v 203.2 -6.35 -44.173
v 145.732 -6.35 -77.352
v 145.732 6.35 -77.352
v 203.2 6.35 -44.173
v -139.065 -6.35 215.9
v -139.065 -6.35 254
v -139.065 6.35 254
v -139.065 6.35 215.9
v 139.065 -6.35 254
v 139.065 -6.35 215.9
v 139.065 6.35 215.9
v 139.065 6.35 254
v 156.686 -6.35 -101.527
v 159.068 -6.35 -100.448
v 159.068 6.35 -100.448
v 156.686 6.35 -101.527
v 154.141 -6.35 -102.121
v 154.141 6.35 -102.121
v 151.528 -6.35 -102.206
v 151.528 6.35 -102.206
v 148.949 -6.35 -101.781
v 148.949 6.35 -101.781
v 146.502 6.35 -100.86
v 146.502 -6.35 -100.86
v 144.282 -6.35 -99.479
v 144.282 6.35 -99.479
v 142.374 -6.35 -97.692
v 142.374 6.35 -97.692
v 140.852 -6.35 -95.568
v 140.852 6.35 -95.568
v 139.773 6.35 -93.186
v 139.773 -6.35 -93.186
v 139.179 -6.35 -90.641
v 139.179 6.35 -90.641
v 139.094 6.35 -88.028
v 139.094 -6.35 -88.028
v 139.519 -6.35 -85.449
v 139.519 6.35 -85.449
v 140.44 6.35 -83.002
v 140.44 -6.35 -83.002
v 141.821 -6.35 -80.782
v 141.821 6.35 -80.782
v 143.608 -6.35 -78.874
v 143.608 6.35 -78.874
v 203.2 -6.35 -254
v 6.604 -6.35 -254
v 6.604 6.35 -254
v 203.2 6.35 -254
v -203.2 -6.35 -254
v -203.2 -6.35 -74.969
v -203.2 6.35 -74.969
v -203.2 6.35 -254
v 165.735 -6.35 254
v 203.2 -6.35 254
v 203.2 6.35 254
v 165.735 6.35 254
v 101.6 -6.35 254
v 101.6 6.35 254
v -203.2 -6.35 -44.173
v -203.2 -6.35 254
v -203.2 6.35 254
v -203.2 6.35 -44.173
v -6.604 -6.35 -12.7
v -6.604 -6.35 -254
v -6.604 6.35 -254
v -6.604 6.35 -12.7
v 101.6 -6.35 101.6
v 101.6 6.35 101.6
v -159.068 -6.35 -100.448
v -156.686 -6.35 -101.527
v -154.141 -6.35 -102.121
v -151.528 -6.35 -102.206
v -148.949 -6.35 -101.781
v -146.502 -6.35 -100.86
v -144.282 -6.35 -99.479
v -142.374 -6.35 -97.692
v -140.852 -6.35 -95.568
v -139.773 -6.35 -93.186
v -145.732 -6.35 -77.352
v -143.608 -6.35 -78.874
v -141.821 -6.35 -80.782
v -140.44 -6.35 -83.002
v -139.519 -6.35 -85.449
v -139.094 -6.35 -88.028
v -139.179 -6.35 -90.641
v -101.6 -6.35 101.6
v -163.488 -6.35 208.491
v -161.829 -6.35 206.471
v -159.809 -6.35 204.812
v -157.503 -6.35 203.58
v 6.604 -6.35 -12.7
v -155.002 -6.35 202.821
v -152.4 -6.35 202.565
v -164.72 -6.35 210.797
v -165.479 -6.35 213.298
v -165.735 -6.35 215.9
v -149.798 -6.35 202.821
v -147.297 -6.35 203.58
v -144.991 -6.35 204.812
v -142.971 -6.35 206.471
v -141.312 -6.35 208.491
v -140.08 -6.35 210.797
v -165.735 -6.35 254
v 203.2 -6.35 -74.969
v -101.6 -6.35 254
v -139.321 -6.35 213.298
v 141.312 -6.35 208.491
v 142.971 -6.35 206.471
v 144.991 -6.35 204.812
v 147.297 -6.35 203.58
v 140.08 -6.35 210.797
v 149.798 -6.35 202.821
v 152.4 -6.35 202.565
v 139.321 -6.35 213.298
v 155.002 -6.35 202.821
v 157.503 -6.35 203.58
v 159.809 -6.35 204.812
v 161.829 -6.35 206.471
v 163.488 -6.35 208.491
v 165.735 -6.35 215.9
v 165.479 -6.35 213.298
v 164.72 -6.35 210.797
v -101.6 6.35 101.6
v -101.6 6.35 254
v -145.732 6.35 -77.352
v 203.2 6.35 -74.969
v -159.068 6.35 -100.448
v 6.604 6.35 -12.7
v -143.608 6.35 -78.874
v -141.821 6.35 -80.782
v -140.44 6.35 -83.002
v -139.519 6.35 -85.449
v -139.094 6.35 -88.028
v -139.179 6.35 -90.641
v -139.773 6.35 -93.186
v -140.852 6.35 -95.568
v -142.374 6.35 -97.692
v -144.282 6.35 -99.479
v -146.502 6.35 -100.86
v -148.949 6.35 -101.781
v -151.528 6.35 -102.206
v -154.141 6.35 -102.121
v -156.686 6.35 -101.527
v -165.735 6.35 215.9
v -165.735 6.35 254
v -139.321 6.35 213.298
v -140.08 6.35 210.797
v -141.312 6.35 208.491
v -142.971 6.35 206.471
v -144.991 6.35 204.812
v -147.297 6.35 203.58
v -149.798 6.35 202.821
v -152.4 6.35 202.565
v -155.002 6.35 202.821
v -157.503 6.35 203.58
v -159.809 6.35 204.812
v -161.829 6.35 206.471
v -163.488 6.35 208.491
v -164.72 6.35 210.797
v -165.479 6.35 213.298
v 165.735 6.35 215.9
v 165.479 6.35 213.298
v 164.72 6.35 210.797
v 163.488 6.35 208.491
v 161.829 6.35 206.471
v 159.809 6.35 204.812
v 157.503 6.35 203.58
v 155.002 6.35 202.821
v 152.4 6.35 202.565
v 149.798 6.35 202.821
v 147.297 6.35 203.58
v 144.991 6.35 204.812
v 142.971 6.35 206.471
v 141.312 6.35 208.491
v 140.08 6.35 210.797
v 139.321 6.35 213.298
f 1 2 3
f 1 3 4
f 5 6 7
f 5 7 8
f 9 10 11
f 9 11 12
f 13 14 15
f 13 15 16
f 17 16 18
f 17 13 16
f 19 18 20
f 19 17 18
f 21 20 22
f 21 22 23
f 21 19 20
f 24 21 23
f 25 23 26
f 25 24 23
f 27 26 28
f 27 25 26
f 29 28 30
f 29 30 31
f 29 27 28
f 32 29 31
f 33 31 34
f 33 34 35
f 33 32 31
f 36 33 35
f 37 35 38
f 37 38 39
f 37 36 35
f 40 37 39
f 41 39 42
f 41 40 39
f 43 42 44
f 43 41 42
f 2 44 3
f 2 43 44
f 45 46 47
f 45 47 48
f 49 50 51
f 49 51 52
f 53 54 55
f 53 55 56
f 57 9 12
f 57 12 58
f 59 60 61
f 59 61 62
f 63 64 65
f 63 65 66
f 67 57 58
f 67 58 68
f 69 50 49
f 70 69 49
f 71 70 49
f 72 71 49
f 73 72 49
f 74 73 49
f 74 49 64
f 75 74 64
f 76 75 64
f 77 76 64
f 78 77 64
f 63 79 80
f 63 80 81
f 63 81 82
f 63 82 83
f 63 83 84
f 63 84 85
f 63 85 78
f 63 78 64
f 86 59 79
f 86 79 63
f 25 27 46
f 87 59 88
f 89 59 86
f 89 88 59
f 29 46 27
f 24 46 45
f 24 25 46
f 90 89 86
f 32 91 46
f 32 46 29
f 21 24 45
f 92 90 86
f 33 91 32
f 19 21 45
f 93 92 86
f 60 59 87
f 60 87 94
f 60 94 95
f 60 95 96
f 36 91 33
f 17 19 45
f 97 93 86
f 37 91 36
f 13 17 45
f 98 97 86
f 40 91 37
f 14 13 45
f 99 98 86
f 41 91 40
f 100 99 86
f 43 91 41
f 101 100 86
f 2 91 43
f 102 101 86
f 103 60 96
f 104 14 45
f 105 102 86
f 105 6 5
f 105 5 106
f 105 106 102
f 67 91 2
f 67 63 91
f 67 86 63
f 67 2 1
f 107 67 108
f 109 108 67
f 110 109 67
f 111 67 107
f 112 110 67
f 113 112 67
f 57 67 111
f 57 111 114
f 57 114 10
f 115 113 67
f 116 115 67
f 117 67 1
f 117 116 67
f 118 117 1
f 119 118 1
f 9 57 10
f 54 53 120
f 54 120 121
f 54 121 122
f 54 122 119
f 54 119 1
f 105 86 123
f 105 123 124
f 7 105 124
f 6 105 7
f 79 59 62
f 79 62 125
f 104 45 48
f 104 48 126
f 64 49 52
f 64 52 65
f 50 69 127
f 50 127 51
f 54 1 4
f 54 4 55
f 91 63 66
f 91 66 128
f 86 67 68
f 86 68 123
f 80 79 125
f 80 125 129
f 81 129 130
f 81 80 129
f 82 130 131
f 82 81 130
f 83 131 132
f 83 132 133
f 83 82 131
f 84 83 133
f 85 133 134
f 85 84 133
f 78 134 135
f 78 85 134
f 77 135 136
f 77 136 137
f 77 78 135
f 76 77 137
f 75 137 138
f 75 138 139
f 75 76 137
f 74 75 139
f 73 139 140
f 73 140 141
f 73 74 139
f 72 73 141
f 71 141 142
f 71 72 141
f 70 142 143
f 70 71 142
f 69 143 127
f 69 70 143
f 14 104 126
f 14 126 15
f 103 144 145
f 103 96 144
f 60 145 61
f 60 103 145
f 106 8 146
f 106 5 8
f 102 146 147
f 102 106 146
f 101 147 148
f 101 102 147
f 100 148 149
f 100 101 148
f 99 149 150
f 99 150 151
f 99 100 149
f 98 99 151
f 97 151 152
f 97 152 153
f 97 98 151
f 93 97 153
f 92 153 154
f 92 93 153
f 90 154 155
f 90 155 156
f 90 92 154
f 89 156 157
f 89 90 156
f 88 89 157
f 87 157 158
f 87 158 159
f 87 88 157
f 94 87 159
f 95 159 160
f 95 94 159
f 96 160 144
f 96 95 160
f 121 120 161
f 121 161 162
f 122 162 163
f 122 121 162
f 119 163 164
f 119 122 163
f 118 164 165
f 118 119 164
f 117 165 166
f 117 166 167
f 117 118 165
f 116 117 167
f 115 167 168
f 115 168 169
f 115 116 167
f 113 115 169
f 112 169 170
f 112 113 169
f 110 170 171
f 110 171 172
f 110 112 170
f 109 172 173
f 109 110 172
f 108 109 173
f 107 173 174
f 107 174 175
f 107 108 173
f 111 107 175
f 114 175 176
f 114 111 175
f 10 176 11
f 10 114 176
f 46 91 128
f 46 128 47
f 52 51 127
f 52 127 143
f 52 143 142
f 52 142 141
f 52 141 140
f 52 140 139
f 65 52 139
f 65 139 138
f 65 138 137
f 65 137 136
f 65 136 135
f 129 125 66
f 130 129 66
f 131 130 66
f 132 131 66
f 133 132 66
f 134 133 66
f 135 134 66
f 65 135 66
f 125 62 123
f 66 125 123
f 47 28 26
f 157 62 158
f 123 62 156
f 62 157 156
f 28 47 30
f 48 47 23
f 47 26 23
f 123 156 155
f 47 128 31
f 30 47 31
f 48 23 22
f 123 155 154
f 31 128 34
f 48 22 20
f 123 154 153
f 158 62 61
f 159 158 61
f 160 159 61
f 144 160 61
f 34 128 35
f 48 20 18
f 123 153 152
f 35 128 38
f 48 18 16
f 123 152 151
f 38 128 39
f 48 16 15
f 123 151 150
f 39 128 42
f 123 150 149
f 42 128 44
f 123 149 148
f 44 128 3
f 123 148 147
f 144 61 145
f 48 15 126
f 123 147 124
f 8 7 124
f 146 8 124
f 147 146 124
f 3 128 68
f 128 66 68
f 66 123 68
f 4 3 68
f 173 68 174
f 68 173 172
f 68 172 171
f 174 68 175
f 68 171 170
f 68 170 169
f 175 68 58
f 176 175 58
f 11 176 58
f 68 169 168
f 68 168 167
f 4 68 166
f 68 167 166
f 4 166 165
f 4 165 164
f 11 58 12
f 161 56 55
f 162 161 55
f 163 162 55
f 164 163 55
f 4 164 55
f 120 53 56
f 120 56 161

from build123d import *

# Parameters (mm, degrees)
F1_DEPTH = 6.35


with BuildPart() as f1:
    # F0 (on Front) → F1 (new body, symmetric)
    with BuildSketch(Plane.XZ):
        with BuildLine():
            Line((-165.735, 254), (-203.2, 254))
            Line((-203.2, 254), (-203.2, -44.172675))
            Line((-203.2, -44.172675), (-145.7325, -77.351551))
            ThreePointArc((-145.7325, -77.351551), (-140.851551, -95.5675), (-159.0675, -100.448449))
            Line((-159.0675, -100.448449), (-203.2, -74.968538))
            Line((-203.2, -74.968538), (-203.2, -254))
            Line((-203.2, -254), (-184.404, -254))
            Line((-184.404, -254), (-171.196, -254))
            Line((-171.196, -254), (-170.47146, -254))
            Line((-170.47146, -254), (-6.604, -254))
            Line((-6.604, -254), (-6.604, -12.7))
            Line((-6.604, -12.7), (6.604, -12.7))
            Line((6.604, -12.7), (6.604, -254))
            Line((6.604, -254), (171.196, -254))
            Line((171.196, -254), (184.404, -254))
            Line((184.404, -254), (188.53423, -254))
            Line((188.53423, -254), (203.2, -254))
            Line((203.2, -254), (203.2, -74.968538))
            Line((203.2, -74.968538), (159.0675, -100.448449))
            ThreePointArc((159.0675, -100.448449), (140.851551, -95.5675), (145.7325, -77.351551))
            Line((145.7325, -77.351551), (203.2, -44.172675))
            Line((203.2, -44.172675), (203.2, 254))
            Line((203.2, 254), (165.735, 254))
            Line((165.735, 254), (165.735, 215.9))
            ThreePointArc((165.735, 215.9), (152.4, 202.565), (139.065, 215.9))
            Line((139.065, 215.9), (139.065, 254))
            Line((139.065, 254), (101.6, 254))
            Line((101.6, 254), (101.6, 101.6))
            Line((101.6, 101.6), (0, 101.6))
            Line((0, 101.6), (-101.6, 101.6))
            Line((-101.6, 101.6), (-101.6, 254))
            Line((-101.6, 254), (-139.065, 254))
            Line((-139.065, 254), (-139.065, 215.9))
            ThreePointArc((-139.065, 215.9), (-152.4, 202.565), (-165.735, 215.9))
            Line((-165.735, 215.9), (-165.735, 254))
        make_face()
    extrude(amount=F1_DEPTH, both=True)


solid = f1.part
